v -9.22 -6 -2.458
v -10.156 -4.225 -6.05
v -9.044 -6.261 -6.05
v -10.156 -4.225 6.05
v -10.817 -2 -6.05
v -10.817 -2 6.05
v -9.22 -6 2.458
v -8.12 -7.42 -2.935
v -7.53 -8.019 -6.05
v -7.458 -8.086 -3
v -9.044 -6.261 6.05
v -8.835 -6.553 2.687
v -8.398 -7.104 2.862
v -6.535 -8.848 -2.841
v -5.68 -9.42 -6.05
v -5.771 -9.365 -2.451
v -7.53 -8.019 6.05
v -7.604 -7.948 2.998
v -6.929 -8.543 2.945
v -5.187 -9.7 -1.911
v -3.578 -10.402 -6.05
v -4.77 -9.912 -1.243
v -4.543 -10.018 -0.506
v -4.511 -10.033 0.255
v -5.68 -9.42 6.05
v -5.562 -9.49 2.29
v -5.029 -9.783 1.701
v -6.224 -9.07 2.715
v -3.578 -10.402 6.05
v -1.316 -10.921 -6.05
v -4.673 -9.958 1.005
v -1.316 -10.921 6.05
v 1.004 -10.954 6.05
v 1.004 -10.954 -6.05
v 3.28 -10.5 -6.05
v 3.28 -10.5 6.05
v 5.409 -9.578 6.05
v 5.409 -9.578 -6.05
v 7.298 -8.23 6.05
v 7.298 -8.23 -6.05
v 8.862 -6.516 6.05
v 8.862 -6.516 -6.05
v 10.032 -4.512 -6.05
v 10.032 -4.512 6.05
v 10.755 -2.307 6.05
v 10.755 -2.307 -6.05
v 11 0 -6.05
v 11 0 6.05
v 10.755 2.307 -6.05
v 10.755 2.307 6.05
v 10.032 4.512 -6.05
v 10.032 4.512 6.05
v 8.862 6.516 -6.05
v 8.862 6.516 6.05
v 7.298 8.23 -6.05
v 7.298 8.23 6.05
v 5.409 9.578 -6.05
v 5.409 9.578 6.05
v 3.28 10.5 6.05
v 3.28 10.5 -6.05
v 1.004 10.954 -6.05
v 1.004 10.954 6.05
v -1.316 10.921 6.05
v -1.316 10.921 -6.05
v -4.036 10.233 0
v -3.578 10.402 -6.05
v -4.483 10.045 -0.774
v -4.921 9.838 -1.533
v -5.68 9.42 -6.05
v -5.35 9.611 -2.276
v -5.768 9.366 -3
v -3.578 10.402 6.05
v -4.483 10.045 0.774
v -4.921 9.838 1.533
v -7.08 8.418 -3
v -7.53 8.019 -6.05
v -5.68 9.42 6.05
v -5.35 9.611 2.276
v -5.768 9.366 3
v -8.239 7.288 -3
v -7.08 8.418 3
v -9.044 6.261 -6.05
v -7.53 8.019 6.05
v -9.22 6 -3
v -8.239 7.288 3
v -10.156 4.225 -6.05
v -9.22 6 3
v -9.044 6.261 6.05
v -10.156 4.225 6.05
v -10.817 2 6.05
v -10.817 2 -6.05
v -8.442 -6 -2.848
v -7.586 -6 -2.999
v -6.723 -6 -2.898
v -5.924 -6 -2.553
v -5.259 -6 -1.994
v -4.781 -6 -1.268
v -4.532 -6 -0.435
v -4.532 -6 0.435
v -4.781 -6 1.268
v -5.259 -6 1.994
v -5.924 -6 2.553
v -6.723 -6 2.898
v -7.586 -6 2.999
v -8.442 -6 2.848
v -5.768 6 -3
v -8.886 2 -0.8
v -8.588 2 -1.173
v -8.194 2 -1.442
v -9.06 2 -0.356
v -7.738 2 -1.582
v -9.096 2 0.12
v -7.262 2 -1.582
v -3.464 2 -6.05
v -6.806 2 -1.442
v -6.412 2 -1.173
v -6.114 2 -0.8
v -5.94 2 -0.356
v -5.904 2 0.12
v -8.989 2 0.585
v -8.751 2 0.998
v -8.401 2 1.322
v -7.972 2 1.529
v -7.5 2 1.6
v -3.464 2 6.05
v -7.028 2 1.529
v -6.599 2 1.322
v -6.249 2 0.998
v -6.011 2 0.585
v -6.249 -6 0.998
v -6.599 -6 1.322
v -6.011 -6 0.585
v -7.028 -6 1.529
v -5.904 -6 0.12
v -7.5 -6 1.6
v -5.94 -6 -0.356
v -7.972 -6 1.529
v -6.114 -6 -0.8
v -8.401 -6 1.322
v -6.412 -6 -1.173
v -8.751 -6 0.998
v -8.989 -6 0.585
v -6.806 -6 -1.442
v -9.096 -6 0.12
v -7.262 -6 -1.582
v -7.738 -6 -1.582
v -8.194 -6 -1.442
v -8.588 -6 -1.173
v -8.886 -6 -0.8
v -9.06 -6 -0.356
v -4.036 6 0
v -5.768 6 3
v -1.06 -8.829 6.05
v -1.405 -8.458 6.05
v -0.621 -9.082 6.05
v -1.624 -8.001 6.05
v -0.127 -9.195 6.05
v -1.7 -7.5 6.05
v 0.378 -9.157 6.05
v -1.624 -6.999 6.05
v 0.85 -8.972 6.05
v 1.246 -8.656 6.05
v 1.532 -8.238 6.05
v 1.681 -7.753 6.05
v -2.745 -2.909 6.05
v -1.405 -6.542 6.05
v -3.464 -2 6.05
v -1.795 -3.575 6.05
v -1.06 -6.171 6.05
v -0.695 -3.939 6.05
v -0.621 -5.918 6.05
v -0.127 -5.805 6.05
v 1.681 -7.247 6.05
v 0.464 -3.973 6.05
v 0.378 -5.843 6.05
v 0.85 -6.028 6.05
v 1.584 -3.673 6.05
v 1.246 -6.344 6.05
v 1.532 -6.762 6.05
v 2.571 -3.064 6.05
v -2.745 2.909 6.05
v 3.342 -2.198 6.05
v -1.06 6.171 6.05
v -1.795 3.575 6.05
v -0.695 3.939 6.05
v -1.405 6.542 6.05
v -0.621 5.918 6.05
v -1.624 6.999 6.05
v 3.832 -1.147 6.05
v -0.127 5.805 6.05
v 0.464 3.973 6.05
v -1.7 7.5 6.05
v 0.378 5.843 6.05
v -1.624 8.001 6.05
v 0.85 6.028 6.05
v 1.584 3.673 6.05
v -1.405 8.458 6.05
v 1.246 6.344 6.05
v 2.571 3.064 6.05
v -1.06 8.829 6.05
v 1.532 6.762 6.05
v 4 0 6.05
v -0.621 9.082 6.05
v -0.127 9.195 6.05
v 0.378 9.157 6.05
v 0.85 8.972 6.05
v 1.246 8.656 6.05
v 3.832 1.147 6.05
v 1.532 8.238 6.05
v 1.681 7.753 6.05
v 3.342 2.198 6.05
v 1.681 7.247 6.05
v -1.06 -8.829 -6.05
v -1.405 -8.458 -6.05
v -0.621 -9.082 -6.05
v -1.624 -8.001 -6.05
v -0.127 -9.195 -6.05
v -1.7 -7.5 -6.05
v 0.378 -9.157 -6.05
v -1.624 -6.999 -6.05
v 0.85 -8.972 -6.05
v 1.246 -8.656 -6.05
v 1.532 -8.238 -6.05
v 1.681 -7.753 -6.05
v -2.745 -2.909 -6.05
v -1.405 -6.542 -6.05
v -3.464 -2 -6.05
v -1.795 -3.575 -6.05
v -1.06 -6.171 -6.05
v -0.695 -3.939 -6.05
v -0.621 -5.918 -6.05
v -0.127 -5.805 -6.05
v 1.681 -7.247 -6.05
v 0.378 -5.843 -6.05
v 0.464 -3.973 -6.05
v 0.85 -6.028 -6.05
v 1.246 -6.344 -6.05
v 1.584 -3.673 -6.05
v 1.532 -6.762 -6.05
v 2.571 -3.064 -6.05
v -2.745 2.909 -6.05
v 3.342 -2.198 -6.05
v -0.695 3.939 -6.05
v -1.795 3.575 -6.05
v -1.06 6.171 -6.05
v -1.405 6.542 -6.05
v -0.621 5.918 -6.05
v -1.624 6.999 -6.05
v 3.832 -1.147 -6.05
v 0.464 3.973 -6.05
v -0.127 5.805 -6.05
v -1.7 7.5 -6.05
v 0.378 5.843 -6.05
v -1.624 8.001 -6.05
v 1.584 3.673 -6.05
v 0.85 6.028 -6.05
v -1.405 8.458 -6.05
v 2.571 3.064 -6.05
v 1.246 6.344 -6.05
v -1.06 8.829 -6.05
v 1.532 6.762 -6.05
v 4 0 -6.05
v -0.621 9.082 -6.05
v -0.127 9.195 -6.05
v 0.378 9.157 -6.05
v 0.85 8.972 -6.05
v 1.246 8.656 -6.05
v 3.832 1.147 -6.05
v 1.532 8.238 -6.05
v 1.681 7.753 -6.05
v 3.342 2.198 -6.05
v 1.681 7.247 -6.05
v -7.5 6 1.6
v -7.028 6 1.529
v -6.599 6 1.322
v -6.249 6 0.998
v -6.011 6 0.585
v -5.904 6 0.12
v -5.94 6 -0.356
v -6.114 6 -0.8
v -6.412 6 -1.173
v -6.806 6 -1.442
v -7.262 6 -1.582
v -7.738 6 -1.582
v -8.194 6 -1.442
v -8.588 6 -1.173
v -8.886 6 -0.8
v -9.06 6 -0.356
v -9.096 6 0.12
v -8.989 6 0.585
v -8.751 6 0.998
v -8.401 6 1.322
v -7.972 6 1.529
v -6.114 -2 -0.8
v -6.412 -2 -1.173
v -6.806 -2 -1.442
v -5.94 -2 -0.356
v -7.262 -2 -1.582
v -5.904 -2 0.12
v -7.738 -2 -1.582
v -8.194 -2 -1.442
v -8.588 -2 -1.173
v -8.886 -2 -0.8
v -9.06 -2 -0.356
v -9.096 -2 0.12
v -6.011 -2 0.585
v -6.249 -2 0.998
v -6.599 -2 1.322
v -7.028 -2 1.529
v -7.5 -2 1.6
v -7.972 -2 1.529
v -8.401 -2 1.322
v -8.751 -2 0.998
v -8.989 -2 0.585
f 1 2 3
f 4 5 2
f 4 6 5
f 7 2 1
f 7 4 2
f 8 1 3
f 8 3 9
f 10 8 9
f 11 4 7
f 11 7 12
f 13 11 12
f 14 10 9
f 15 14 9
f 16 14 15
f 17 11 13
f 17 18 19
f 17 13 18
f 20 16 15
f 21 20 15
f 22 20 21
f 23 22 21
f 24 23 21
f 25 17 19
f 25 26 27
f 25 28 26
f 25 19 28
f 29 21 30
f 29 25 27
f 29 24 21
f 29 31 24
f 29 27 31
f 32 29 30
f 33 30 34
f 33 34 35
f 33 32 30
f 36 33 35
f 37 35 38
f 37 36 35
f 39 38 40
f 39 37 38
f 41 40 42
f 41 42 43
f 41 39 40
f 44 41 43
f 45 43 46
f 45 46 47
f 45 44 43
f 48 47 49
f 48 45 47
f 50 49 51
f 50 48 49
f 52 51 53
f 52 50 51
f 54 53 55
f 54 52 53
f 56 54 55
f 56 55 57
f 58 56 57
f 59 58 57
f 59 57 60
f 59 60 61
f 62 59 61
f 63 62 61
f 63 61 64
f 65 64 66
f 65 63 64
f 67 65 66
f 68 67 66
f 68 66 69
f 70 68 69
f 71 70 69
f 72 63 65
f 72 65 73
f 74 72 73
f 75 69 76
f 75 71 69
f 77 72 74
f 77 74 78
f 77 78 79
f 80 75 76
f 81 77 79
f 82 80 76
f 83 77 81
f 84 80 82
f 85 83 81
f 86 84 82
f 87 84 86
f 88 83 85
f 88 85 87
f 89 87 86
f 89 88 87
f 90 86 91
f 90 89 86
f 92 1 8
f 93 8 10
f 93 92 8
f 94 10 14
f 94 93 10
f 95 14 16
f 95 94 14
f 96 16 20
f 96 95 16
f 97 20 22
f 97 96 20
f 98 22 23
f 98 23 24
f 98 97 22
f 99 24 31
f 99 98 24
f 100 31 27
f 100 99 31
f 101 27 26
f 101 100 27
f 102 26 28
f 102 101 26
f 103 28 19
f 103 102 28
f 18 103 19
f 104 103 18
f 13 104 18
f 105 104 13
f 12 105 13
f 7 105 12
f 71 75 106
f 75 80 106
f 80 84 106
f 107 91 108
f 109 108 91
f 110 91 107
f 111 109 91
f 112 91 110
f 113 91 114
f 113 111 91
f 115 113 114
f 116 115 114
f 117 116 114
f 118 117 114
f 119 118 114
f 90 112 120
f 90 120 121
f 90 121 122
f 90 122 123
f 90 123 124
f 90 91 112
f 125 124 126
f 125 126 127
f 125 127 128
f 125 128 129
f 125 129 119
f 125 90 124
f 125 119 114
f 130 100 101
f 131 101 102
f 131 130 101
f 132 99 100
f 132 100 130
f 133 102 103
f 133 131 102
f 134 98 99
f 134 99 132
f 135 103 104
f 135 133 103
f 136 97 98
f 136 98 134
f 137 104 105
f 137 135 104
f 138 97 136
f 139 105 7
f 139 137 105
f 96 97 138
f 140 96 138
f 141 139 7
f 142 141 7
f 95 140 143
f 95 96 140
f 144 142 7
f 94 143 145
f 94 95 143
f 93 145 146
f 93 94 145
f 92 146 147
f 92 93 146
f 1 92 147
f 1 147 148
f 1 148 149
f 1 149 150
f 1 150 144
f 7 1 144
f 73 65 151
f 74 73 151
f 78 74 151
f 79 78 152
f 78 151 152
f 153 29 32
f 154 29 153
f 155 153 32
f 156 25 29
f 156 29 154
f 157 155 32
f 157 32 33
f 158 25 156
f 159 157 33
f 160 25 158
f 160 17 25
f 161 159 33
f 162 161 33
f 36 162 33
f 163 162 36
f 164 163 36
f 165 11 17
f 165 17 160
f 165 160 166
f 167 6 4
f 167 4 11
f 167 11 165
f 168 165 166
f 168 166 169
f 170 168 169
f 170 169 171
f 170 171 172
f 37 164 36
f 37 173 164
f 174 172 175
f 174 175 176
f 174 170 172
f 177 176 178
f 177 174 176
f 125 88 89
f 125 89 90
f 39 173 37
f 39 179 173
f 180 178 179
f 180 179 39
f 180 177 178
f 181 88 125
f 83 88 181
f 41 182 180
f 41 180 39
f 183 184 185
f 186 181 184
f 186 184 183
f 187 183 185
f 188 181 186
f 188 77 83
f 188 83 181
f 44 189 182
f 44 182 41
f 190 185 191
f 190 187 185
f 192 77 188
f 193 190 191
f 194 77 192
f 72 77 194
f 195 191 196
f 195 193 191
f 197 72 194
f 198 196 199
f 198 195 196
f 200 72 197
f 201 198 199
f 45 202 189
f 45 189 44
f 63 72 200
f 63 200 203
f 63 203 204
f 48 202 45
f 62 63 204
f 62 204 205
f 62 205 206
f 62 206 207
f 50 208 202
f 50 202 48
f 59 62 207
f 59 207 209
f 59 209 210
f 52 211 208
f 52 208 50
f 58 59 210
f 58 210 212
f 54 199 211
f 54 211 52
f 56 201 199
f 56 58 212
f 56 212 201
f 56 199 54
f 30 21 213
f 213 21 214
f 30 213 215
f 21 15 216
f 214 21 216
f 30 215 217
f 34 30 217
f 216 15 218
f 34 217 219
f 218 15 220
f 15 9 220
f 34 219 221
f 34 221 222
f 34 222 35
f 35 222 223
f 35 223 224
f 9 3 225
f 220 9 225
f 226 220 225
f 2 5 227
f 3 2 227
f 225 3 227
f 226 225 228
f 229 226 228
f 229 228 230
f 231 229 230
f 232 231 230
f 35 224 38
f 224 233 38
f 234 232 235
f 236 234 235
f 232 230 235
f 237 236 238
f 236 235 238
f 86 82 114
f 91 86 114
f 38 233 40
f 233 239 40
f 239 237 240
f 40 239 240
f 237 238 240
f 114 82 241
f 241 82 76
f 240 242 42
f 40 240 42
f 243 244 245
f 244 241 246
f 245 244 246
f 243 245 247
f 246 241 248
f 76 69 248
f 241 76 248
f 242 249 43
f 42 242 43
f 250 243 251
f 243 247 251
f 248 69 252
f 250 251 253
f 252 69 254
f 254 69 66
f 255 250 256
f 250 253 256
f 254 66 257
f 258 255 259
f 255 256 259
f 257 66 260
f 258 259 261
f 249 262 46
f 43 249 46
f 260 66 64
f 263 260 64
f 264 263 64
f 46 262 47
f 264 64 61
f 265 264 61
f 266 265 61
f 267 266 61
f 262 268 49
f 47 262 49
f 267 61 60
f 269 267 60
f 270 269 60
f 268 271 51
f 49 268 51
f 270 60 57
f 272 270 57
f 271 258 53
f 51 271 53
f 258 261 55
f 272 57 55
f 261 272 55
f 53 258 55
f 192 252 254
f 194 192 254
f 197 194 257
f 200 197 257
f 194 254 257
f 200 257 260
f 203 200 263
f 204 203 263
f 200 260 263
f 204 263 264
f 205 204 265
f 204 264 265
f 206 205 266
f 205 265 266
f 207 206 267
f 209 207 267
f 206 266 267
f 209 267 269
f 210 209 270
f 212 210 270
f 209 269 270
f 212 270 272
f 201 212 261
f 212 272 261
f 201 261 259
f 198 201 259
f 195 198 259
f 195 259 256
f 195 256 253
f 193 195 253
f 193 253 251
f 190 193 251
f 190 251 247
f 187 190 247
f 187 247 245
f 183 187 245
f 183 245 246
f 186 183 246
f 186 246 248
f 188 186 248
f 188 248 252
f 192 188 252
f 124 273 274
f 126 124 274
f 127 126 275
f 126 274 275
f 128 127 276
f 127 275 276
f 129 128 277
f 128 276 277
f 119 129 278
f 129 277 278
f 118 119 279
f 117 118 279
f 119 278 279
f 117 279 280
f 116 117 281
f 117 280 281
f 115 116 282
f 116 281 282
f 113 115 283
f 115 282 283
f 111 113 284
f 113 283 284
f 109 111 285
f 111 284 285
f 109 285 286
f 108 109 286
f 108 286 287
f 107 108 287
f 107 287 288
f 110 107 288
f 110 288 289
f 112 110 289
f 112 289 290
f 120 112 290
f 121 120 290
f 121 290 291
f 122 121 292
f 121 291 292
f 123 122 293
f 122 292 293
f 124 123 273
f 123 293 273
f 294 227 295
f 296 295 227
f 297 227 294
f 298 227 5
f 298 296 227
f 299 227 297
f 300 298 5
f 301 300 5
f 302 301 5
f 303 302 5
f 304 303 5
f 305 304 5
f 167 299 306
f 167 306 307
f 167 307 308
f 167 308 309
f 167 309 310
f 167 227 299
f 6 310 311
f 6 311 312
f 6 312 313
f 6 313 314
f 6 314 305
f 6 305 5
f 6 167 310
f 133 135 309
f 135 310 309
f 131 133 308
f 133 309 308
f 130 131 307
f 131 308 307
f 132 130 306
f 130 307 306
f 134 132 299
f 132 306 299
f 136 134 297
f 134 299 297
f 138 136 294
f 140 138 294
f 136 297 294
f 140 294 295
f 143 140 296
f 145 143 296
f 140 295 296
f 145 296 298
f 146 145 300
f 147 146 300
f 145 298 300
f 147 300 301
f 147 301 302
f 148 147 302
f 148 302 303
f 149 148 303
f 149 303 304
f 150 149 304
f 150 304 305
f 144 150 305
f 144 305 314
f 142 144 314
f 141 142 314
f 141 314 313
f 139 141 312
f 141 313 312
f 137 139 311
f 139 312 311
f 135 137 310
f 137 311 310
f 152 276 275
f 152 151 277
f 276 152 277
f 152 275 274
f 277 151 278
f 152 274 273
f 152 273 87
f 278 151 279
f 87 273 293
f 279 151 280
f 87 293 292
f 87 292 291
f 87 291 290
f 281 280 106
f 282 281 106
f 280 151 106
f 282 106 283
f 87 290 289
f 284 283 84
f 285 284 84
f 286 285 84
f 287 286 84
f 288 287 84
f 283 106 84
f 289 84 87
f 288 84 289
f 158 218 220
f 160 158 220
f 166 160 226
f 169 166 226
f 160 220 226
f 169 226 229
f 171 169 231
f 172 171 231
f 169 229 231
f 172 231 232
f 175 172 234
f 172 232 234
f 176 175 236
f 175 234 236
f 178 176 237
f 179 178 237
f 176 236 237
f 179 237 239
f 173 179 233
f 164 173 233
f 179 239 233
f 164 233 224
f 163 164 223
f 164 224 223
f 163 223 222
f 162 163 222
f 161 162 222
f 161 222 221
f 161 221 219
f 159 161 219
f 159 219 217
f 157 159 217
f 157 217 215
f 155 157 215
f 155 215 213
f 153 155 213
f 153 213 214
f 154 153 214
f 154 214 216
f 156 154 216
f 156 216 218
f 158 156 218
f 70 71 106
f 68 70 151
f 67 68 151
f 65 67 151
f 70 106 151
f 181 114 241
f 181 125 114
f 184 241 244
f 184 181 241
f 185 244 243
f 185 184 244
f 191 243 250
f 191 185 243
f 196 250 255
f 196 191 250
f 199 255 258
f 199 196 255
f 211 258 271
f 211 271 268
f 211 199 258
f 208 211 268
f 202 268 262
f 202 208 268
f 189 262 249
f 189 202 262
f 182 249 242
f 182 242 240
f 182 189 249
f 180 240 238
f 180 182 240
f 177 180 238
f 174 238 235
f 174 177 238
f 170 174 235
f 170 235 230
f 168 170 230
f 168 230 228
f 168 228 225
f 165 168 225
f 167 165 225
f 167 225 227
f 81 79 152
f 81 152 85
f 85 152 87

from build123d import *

# Parameters (mm, degrees)
EXTRUDE_1_DEPTH     = 6.05
SKETCH_3_R          = 1.6
CUT_EXTRUDE_1_DEPTH = 12.5
SKETCH_4_R          = 1.7
CUT_EXTRUDE_2_DEPTH = 25
SKETCH_5_R          = 3
CUT_EXTRUDE_3_DEPTH = 10
CUT_EXTRUDE_4_DEPTH = 10


with BuildPart() as part:
    # 草图1 → 凸台-拉伸1 (new, symmetric)
    with BuildSketch(Plane.XY):
        with BuildLine():
            ThreePointArc((-3.464101615, 2), (1.03527618, 3.863703305), (4, 0))
            Line((4, 0), (11, 0))
            ThreePointArc((11, 0), (1.004193186, 10.954067557), (-10.816653826, 2))
            Line((-10.816653826, 2), (-3.464101615, 2))
        make_face()
        with BuildLine():
            Line((11, 0), (4, 0))
            ThreePointArc((4, 0), (1.03527618, -3.863703305), (-3.464101615, -2))
            Line((-3.464101615, -2), (-10.816653826, -2))
            ThreePointArc((-10.816653826, -2), (1.004193186, -10.954067557), (11, 0))
        make_face()
    extrude(amount=EXTRUDE_1_DEPTH, both=True)

    # 草图3 → 切除-拉伸1 (cut, symmetric)
    with BuildSketch(Plane(origin=(0, 0, 0), x_dir=(1, 0, 0), z_dir=(0, 1, 0))):
        with Locations(Location((-7.5, 0, 0), (0, 0, 270))):
            Circle(SKETCH_3_R)
    extrude(amount=CUT_EXTRUDE_1_DEPTH, both=True, mode=Mode.SUBTRACT)

    # 草图4 → 切除-拉伸2 (cut)
    with BuildSketch(Plane(origin=(0, 0, -6.05), x_dir=(-1, 0, 0), z_dir=(0, 0, -1))):
        with Locations((0, 7.5)):
            Circle(SKETCH_4_R)
        with Locations((0, -7.5)):
            Circle(SKETCH_4_R)
    extrude(amount=-CUT_EXTRUDE_2_DEPTH, mode=Mode.SUBTRACT)

    # 草图5 → 切除-拉伸3 (cut)
    with BuildSketch(Plane(origin=(0, -6, 0), x_dir=(-1, 0, 0), z_dir=(0, -1, 0))):
        with Locations((7.5, 0)):
            Circle(SKETCH_5_R)
    extrude(amount=CUT_EXTRUDE_3_DEPTH, mode=Mode.SUBTRACT)

    # 草图6 → 切除-拉伸4 (cut)
    with BuildSketch(Plane(origin=(0, 6, 0), x_dir=(-1, 0, 0), z_dir=(0, -1, 0))):
        Polygon((10.964101615, 0), (9.232050808, 3), (5.767949192, 3), (4.035898385, 0), (5.767949192, -3), (9.232050808, -3), align=None)
    extrude(amount=-CUT_EXTRUDE_4_DEPTH, mode=Mode.SUBTRACT)


solid = part.part
